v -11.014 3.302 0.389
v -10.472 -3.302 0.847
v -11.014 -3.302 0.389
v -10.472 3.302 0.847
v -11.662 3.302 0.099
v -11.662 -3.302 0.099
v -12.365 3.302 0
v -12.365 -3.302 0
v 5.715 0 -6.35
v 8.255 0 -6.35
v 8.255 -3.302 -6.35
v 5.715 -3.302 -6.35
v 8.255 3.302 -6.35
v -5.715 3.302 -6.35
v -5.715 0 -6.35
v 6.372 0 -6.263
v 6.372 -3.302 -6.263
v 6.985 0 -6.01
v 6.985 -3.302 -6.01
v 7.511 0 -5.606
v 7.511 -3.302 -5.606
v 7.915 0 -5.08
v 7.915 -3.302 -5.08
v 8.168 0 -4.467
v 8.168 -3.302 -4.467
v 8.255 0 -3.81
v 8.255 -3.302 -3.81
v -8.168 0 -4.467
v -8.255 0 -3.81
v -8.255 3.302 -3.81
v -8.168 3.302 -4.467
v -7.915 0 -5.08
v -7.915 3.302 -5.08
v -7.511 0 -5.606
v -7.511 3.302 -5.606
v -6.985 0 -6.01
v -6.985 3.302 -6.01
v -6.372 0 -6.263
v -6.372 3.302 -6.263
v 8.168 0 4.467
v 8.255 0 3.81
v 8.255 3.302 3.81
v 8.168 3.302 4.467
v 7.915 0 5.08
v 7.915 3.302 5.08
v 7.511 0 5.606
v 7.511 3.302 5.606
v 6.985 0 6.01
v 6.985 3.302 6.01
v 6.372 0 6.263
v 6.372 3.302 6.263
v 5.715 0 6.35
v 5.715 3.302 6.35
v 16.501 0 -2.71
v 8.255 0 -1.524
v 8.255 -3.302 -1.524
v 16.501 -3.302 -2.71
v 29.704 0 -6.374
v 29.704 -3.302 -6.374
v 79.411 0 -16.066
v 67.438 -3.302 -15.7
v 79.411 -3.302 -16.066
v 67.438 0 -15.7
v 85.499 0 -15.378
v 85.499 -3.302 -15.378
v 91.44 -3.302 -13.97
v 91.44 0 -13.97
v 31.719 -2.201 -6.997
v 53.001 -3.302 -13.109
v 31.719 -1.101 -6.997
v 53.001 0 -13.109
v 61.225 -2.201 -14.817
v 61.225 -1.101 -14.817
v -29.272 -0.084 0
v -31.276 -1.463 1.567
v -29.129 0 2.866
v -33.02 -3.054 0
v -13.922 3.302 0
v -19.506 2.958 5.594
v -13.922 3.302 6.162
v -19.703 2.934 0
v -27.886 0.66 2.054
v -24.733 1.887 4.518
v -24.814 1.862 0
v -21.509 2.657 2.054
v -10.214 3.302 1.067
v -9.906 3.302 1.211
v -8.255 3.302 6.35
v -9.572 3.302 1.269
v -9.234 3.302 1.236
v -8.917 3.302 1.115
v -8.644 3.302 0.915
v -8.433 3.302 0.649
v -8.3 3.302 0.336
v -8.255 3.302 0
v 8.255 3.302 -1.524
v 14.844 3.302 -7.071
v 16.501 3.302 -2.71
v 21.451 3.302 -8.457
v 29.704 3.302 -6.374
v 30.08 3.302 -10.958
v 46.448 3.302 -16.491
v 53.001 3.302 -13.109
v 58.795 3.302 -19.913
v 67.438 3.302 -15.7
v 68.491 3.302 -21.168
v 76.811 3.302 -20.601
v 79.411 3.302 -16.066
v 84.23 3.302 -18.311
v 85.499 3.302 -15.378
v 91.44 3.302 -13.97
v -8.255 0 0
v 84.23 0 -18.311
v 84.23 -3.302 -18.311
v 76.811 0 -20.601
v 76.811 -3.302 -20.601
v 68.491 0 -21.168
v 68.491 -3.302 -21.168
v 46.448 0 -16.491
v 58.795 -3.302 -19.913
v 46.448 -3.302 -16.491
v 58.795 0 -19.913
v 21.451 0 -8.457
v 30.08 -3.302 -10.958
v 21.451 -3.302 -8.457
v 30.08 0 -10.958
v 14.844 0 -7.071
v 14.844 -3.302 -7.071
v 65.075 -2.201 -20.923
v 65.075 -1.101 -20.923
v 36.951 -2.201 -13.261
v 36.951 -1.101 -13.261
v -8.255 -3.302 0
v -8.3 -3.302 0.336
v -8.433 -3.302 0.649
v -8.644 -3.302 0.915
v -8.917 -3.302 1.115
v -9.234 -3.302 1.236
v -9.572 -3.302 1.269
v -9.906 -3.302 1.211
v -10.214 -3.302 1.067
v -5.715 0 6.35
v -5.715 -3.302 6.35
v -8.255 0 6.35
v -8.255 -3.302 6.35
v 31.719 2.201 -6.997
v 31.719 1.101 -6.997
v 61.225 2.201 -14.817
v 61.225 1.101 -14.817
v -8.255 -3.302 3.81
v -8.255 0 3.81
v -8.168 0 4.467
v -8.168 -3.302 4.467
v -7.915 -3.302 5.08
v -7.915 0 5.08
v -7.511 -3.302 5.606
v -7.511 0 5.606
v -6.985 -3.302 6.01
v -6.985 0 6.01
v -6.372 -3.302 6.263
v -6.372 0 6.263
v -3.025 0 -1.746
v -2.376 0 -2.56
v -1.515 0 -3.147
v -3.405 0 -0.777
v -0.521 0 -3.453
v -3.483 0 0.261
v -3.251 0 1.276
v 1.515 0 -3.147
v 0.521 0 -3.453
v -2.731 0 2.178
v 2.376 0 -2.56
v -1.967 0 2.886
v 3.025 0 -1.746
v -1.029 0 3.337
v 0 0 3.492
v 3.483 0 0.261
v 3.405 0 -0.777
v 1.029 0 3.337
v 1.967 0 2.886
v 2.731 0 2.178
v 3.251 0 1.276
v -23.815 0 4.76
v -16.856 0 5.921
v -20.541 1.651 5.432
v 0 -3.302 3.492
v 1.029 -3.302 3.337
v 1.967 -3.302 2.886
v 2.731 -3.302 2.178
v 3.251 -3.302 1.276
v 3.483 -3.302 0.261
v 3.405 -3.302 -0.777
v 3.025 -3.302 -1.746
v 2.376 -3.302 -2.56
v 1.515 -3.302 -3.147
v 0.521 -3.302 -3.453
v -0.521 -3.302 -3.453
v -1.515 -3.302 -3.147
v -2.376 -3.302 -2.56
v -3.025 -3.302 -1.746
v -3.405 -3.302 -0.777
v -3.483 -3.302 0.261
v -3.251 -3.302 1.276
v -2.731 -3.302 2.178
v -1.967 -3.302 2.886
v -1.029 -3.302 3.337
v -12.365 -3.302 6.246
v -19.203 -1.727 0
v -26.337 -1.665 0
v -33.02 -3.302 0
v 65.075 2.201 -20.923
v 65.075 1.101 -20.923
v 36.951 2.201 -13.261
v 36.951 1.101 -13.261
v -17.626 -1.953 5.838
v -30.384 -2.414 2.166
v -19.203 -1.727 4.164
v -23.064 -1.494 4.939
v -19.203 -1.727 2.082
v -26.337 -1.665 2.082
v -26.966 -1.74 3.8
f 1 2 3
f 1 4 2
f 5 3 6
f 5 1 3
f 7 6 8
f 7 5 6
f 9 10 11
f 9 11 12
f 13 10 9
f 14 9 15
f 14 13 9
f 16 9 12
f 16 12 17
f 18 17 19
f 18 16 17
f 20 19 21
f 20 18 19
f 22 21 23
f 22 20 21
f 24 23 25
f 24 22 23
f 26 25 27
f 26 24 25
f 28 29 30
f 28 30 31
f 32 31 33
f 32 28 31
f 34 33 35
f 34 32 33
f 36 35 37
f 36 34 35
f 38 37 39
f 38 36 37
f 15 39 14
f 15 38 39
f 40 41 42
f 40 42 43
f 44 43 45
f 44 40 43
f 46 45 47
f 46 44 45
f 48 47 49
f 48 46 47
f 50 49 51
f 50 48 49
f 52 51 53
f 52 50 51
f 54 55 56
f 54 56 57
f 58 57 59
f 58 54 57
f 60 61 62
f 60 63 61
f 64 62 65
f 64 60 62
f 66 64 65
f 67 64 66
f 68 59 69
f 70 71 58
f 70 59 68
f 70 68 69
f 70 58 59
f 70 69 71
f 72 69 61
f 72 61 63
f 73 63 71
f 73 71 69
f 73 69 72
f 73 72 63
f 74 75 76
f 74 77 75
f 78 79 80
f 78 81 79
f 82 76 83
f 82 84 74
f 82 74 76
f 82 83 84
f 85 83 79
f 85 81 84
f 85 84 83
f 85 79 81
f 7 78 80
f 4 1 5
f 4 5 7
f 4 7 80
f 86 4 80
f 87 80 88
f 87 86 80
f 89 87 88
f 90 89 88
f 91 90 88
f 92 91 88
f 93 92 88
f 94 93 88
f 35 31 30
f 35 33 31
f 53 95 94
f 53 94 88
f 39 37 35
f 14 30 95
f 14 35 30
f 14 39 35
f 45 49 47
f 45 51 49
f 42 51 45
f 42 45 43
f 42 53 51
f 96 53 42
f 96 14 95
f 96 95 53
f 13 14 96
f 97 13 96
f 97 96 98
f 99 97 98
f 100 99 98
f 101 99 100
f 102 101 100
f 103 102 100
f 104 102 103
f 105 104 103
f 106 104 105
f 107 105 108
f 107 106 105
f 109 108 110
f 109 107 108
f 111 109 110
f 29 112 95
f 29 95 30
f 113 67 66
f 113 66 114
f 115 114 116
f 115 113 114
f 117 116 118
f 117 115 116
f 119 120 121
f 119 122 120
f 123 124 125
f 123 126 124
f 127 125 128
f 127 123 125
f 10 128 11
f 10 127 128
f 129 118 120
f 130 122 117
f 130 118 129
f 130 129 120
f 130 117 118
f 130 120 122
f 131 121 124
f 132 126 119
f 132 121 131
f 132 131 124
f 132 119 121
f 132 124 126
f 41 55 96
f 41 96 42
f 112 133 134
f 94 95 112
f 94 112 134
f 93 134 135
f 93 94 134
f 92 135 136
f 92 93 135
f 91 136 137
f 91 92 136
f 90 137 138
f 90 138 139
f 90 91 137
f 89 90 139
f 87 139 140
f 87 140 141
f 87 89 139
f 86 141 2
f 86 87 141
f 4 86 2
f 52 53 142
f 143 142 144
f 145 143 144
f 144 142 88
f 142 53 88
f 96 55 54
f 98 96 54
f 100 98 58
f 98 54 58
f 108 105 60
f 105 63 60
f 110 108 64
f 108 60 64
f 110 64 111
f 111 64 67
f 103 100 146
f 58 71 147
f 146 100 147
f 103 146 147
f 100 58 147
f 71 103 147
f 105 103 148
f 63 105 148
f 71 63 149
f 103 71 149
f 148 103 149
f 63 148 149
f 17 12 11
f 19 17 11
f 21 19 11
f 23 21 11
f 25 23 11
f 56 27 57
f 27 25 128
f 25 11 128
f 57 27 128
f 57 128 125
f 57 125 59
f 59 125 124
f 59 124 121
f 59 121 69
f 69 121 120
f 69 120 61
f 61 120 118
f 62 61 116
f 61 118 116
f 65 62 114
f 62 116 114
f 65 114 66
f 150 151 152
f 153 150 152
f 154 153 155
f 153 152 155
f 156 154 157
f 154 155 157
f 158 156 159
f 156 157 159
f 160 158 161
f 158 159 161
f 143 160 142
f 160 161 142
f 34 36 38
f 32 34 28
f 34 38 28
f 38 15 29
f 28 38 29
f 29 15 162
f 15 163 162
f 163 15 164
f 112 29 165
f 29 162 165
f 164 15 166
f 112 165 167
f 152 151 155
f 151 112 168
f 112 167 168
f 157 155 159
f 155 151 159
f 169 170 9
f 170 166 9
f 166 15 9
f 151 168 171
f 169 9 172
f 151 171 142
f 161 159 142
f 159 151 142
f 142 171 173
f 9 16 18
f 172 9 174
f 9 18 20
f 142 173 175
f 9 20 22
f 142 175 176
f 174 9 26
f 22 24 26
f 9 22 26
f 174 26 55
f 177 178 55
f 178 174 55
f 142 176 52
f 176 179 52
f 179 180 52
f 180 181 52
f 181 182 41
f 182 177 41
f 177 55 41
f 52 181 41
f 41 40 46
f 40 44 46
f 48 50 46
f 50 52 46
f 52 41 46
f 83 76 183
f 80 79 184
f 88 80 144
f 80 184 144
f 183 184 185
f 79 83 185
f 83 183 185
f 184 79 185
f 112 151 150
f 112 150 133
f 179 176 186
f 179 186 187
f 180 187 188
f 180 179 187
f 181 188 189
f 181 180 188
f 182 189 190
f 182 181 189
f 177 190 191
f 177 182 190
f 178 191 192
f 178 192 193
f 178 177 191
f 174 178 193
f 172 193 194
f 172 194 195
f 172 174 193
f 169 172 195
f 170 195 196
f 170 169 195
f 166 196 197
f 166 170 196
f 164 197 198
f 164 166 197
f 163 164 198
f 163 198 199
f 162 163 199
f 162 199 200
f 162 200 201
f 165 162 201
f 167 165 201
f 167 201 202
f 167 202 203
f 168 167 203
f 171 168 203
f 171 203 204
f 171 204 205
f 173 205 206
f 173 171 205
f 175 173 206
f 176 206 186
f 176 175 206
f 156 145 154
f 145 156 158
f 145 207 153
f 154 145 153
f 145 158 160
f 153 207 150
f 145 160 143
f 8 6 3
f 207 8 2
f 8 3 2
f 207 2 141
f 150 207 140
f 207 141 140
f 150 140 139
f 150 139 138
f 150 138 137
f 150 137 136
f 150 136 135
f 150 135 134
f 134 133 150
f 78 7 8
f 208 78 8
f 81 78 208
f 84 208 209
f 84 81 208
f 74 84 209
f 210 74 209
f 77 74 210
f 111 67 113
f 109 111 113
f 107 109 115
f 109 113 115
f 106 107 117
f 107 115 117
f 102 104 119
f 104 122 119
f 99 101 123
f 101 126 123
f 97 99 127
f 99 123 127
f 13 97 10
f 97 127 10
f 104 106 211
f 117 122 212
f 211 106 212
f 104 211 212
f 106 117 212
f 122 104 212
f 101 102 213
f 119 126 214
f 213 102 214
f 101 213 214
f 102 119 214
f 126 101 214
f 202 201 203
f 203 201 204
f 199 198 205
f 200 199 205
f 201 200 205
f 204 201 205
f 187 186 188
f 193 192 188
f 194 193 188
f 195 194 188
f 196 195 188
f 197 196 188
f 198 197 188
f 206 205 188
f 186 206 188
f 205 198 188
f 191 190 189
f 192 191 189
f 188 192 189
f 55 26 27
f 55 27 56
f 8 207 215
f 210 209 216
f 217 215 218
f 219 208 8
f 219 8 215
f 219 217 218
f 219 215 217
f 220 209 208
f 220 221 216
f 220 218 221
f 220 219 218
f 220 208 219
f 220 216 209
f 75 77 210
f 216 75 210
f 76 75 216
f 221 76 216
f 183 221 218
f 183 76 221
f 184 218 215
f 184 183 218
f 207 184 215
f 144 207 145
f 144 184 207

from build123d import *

# Parameters (mm, degrees)
SKETCH1_R                = 3.4925
BOSS_EXTRUDE3_DEPTH      = 3.302
BOSS_EXTRUDE4_DEPTH      = 3.302
BOSS_EXTRUDE5_DEPTH      = 3.302
CUT_EXTRUDE1_REACH       = 8.35
SKETCH1_11_R             = 3.4925
BOSS_EXTRUDE6_DEPTH      = 3.302
BOSS_EXTRUDE6_DEPTH_BACK = 3.302


with BuildPart() as part:
    # Sketch1 → Boss-Extrude3 (new body)
    with BuildSketch(Plane(origin=(0, 0, 0), x_dir=(1, 0, 0), z_dir=(0, 1, 0))):
        with BuildLine():
            ThreePointArc((-10.47160211, -0.846666667), (-11.327855674, -0.22130784), (-12.364806331, 0))
            Line((-12.364806331, 0), (-33.02, 0))
            add(Edge.make_bspline(
                [(-33.02, 0), (-27.473096433, -6.223159861), (-8.255, -6.35)],
                knots=[0, 0, 0, 1, 1, 1], degree=2))
            Line((-8.255, -6.35), (-8.255, -3.81))
            Line((-8.255, -3.81), (-8.255, 0))
            ThreePointArc((-8.255, 0), (-9.071835946, -1.186398896), (-10.47160211, -0.846666667))
        make_face()
        with BuildLine():
            ThreePointArc((5.715, 6.35), (7.511051224, 5.606051224), (8.255, 3.81))
            Line((8.255, 3.81), (8.255, -3.81))
            ThreePointArc((8.255, -3.81), (7.511051224, -5.606051224), (5.715, -6.35))
            Line((5.715, -6.35), (-5.715, -6.35))
            ThreePointArc((-5.715, -6.35), (-7.511051224, -5.606051224), (-8.255, -3.81))
            Line((-8.255, -3.81), (-8.255, 3.81))
            ThreePointArc((-8.255, 3.81), (-7.511051224, 5.606051224), (-5.715, 6.35))
            Line((-5.715, 6.35), (5.715, 6.35))
        make_face()
        with Locations(Location((0, 0, 0), (0, 0, 270))):  # turned: the seam where the file's is
            Circle(SKETCH1_R, mode=Mode.SUBTRACT)
        with BuildLine():
            ThreePointArc((-8.255, -3.81), (-7.511051224, -5.606051224), (-5.715, -6.35))
            Line((-5.715, -6.35), (-8.255, -6.35))
            Line((-8.255, -6.35), (-8.255, -3.81))
        make_face()
        with BuildLine():
            Line((8.255, 3.527942587), (8.255, 1.524))
            add(Edge.make_bspline(
                [(8.255, 1.524), (26.922144182, 2.150849617), (62.646246262, 22.822886738), (91.44, 13.97)],
                knots=[0, 0, 0, 0, 1, 1, 1, 1], degree=3))
            add(Edge.make_bspline(
                [(91.44, 13.97), (66.350363848, 33.352051218), (36.841337127, 7.764653999), (8.255, 6.35)],
                knots=[0, 0, 0, 0, 1, 1, 1, 1], degree=3))
            Line((8.255, 6.35), (8.255, 3.81))
            Line((8.255, 3.81), (8.255, 3.527942587))
        make_face()
        with BuildLine():
            Line((8.255, 6.35), (5.715, 6.35))
            ThreePointArc((5.715, 6.35), (7.511051224, 5.606051224), (8.255, 3.81))
            Line((8.255, 3.81), (8.255, 6.35))
        make_face()
    extrude(amount=BOSS_EXTRUDE3_DEPTH)

    # Sketch1_8 → Boss-Extrude4 (add)
    with BuildSketch(Plane(origin=(0, 0, 0), x_dir=(1, 0, 0), z_dir=(0, 1, 0))):
        with BuildLine():
            Line((8.255, 3.527942587), (8.255, 1.524))
            add(Edge.make_bspline(
                [(8.255, 1.524), (26.922144182, 2.150849617), (62.646246262, 22.822886738), (91.44, 13.97)],
                knots=[0, 0, 0, 0, 1, 1, 1, 1], degree=3))
            add(Edge.make_bspline(
                [(91.44, 13.97), (66.350363848, 33.352051218), (36.841337127, 7.764653999), (8.255, 6.35)],
                knots=[0, 0, 0, 0, 1, 1, 1, 1], degree=3))
            Line((8.255, 6.35), (8.255, 3.81))
            Line((8.255, 3.81), (8.255, 3.527942587))
        make_face()
        with BuildLine():
            Line((8.255, 6.35), (5.715, 6.35))
            ThreePointArc((5.715, 6.35), (7.511051224, 5.606051224), (8.255, 3.81))
            Line((8.255, 3.81), (8.255, 6.35))
        make_face()
    extrude(amount=-BOSS_EXTRUDE4_DEPTH)

    # Sketch1_9 → Boss-Extrude5 (add)
    with BuildSketch(Plane(origin=(0, 0, 0), x_dir=(1, 0, 0), z_dir=(0, 1, 0))):
        with BuildLine():
            ThreePointArc((-10.47160211, -0.846666667), (-11.327855674, -0.22130784), (-12.364806331, 0))
            Line((-12.364806331, 0), (-33.02, 0))
            add(Edge.make_bspline(
                [(-33.02, 0), (-27.473096433, -6.223159861), (-8.255, -6.35)],
                knots=[0, 0, 0, 1, 1, 1], degree=2))
            Line((-8.255, -6.35), (-8.255, -3.81))
            Line((-8.255, -3.81), (-8.255, 0))
            ThreePointArc((-8.255, 0), (-9.071835946, -1.186398896), (-10.47160211, -0.846666667))
        make_face()
        with BuildLine():
            ThreePointArc((-8.255, -3.81), (-7.511051224, -5.606051224), (-5.715, -6.35))
            Line((-5.715, -6.35), (-8.255, -6.35))
            Line((-8.255, -6.35), (-8.255, -3.81))
        make_face()
    extrude(amount=-BOSS_EXTRUDE5_DEPTH)

    # Sketch2 → Cut-Extrude1 (cut, up to next)
    with BuildSketch(Plane.XY, mode=Mode.PRIVATE) as cut_extrude1_sk1:
        with BuildLine():
            Line((-33.02, 3.302), (-33.02, -3.053994927))
            add(Edge.make_bspline(
                [(-33.02, -3.053994927), (-28.519594092, 1.640722514), (-22.101826858, 3.211473856), (-13.921878912, 3.302)],
                knots=[0, 0, 0, 0, 0.941080878, 0.941080878, 0.941080878, 0.941080878], degree=3))
            Line((-13.921878912, 3.302), (-33.02, 3.302))
        make_face()
    cut_extrude1_tool1 = extrude(cut_extrude1_sk1.sketch, amount=CUT_EXTRUDE1_REACH, mode=Mode.PRIVATE) & part.part
    add(cut_extrude1_tool1.solids().sort_by_distance((-28.707051, 1.545014, 0))[0], mode=Mode.SUBTRACT)
    # Sketch2 → Cut-Extrude1 (cut, up to next)
    with BuildSketch(Plane.XY, mode=Mode.PRIVATE) as cut_extrude1_sk2:
        with BuildLine():
            Line((-12.364806331, -3.302), (-33.02, -3.302))
            add(Edge.make_bspline(
                [(-12.364806331, -3.302), (-18.804874471, -1.031483357), (-26.812471442, -0.753963495), (-33.02, -3.302)],
                knots=[0, 0, 0, 0, 1, 1, 1, 1], degree=3))
        make_face()
    cut_extrude1_tool2 = extrude(cut_extrude1_sk2.sketch, amount=CUT_EXTRUDE1_REACH, mode=Mode.PRIVATE) & part.part
    add(cut_extrude1_tool2.solids().sort_by_distance((-22.84596, -2.573969, 0))[0], mode=Mode.SUBTRACT)

    # Sketch1_11 → Boss-Extrude6 (add, two sides)
    with BuildSketch(Plane(origin=(0, 0, 0), x_dir=(1, 0, 0), z_dir=(0, 1, 0))) as boss_extrude6_sk:
        with Locations(Location((0, 0, 0), (0, 0, 270))):  # turned: the seam where the file's is
            Circle(SKETCH1_11_R)
    extrude(amount=BOSS_EXTRUDE6_DEPTH)
    extrude(boss_extrude6_sk.sketch, amount=-BOSS_EXTRUDE6_DEPTH_BACK)


solid = part.part
